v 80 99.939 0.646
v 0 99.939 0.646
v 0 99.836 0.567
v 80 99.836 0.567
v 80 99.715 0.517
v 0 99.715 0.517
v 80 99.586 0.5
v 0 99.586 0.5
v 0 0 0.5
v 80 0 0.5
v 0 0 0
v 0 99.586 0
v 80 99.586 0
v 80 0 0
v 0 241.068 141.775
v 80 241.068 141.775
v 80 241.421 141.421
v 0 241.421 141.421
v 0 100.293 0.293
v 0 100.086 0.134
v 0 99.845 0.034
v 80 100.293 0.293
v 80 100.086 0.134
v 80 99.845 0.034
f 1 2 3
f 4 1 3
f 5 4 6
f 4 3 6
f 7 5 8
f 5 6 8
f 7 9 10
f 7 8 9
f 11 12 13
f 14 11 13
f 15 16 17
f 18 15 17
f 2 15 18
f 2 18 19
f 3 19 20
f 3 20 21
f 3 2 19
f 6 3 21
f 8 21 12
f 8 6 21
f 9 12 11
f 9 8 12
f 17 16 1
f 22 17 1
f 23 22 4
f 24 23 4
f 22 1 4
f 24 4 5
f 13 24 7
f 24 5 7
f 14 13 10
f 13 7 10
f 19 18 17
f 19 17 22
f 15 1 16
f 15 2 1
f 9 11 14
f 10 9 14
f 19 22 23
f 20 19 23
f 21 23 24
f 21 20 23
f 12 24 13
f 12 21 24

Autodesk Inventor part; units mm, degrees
ref_plane "YZ Plane" through (0, 0, 0) normal (1, 0, 0) x (0, 1, 0)
ref_plane "XZ Plane" through (0, 0, 0) normal (0, 1, 0) x (-1, 0, 0)
ref_plane "XY Plane" through (0, 0, 0) normal (0, 0, 1) x (1, 0, 0)
sketch "Sketch1" plane through (0, 0, 0) normal (0, 0, 1) x (1, 0, 0)
  line L0 (0, 0) -> (80, 0)
  line L1 (80, 0) -> (80, 100)
  line L2 (80, 100) -> (0, 100)
  line L3 (0, 100) -> (0, 0)
  dimension "d0" = 80
  dimension "d1" = 100
extrude "Plate1" add sketch "Sketch1" along normal blind 0.5
sketch "Sketch2" plane through (0, 99.6464, 0.3536) normal (0, 0.7071068, -0.7071068) x (-1, 0, 0)
  line L0 (-80, 0) -> (0, 0)
  line L1 (0, 0) -> (0, 200)
  line L2 (0, 200) -> (-80, 200)
  line L3 (-80, 200) -> (-80, 0)
edge flange "Flange1" height 200 angle 45 thickness 0.5 bend radius 0.5 thickness toward (0, 0.7071068, -0.7071068) relief tear relief width 0.5 relief depth 0.25 edges at (40, 100, 0.5) wall of the first edge with corners at (80, 99.6464, 0.3536) (0, 99.6464, 0.3536) (0, 241.0678, 141.7749) (80, 241.0678, 141.7749)
bend "Bend1"
corner "Corner1"
equation "\"d3\" = BendReliefWidth"
equation "\"d4\" = BendReliefDepth"
equation "\"d5\" = MinimumRemnant"
equation "\"d6\" = BendRadius"
equation "\"d9\" = BendRadius"
equation "\"d10\" = CornerReliefSize"
equation "\"d11\" = GapSize"
equation "\"d12\" = JacobiRadiusSize"
equation "\"BendRadius\" = Thickness"
equation "\"BendReliefWidth\" = Thickness"
equation "\"BendReliefDepth\" = 0.5 * Thickness"
equation "\"CornerReliefSize\" = 4 * Thickness"
equation "\"MinimumRemnant\" = 2 * Thickness"
equation "\"TransitionRadius\" = BendRadius"
equation "\"JacobiRadiusSize\" = BendRadius"
equation "\"GapSize\" = Thickness"
equation "\"d2\" = BendRadius"
equation "\"Thickness\" = 0.5"
properties part number "Tunel_GridPlate" material "Stainless Steel"
